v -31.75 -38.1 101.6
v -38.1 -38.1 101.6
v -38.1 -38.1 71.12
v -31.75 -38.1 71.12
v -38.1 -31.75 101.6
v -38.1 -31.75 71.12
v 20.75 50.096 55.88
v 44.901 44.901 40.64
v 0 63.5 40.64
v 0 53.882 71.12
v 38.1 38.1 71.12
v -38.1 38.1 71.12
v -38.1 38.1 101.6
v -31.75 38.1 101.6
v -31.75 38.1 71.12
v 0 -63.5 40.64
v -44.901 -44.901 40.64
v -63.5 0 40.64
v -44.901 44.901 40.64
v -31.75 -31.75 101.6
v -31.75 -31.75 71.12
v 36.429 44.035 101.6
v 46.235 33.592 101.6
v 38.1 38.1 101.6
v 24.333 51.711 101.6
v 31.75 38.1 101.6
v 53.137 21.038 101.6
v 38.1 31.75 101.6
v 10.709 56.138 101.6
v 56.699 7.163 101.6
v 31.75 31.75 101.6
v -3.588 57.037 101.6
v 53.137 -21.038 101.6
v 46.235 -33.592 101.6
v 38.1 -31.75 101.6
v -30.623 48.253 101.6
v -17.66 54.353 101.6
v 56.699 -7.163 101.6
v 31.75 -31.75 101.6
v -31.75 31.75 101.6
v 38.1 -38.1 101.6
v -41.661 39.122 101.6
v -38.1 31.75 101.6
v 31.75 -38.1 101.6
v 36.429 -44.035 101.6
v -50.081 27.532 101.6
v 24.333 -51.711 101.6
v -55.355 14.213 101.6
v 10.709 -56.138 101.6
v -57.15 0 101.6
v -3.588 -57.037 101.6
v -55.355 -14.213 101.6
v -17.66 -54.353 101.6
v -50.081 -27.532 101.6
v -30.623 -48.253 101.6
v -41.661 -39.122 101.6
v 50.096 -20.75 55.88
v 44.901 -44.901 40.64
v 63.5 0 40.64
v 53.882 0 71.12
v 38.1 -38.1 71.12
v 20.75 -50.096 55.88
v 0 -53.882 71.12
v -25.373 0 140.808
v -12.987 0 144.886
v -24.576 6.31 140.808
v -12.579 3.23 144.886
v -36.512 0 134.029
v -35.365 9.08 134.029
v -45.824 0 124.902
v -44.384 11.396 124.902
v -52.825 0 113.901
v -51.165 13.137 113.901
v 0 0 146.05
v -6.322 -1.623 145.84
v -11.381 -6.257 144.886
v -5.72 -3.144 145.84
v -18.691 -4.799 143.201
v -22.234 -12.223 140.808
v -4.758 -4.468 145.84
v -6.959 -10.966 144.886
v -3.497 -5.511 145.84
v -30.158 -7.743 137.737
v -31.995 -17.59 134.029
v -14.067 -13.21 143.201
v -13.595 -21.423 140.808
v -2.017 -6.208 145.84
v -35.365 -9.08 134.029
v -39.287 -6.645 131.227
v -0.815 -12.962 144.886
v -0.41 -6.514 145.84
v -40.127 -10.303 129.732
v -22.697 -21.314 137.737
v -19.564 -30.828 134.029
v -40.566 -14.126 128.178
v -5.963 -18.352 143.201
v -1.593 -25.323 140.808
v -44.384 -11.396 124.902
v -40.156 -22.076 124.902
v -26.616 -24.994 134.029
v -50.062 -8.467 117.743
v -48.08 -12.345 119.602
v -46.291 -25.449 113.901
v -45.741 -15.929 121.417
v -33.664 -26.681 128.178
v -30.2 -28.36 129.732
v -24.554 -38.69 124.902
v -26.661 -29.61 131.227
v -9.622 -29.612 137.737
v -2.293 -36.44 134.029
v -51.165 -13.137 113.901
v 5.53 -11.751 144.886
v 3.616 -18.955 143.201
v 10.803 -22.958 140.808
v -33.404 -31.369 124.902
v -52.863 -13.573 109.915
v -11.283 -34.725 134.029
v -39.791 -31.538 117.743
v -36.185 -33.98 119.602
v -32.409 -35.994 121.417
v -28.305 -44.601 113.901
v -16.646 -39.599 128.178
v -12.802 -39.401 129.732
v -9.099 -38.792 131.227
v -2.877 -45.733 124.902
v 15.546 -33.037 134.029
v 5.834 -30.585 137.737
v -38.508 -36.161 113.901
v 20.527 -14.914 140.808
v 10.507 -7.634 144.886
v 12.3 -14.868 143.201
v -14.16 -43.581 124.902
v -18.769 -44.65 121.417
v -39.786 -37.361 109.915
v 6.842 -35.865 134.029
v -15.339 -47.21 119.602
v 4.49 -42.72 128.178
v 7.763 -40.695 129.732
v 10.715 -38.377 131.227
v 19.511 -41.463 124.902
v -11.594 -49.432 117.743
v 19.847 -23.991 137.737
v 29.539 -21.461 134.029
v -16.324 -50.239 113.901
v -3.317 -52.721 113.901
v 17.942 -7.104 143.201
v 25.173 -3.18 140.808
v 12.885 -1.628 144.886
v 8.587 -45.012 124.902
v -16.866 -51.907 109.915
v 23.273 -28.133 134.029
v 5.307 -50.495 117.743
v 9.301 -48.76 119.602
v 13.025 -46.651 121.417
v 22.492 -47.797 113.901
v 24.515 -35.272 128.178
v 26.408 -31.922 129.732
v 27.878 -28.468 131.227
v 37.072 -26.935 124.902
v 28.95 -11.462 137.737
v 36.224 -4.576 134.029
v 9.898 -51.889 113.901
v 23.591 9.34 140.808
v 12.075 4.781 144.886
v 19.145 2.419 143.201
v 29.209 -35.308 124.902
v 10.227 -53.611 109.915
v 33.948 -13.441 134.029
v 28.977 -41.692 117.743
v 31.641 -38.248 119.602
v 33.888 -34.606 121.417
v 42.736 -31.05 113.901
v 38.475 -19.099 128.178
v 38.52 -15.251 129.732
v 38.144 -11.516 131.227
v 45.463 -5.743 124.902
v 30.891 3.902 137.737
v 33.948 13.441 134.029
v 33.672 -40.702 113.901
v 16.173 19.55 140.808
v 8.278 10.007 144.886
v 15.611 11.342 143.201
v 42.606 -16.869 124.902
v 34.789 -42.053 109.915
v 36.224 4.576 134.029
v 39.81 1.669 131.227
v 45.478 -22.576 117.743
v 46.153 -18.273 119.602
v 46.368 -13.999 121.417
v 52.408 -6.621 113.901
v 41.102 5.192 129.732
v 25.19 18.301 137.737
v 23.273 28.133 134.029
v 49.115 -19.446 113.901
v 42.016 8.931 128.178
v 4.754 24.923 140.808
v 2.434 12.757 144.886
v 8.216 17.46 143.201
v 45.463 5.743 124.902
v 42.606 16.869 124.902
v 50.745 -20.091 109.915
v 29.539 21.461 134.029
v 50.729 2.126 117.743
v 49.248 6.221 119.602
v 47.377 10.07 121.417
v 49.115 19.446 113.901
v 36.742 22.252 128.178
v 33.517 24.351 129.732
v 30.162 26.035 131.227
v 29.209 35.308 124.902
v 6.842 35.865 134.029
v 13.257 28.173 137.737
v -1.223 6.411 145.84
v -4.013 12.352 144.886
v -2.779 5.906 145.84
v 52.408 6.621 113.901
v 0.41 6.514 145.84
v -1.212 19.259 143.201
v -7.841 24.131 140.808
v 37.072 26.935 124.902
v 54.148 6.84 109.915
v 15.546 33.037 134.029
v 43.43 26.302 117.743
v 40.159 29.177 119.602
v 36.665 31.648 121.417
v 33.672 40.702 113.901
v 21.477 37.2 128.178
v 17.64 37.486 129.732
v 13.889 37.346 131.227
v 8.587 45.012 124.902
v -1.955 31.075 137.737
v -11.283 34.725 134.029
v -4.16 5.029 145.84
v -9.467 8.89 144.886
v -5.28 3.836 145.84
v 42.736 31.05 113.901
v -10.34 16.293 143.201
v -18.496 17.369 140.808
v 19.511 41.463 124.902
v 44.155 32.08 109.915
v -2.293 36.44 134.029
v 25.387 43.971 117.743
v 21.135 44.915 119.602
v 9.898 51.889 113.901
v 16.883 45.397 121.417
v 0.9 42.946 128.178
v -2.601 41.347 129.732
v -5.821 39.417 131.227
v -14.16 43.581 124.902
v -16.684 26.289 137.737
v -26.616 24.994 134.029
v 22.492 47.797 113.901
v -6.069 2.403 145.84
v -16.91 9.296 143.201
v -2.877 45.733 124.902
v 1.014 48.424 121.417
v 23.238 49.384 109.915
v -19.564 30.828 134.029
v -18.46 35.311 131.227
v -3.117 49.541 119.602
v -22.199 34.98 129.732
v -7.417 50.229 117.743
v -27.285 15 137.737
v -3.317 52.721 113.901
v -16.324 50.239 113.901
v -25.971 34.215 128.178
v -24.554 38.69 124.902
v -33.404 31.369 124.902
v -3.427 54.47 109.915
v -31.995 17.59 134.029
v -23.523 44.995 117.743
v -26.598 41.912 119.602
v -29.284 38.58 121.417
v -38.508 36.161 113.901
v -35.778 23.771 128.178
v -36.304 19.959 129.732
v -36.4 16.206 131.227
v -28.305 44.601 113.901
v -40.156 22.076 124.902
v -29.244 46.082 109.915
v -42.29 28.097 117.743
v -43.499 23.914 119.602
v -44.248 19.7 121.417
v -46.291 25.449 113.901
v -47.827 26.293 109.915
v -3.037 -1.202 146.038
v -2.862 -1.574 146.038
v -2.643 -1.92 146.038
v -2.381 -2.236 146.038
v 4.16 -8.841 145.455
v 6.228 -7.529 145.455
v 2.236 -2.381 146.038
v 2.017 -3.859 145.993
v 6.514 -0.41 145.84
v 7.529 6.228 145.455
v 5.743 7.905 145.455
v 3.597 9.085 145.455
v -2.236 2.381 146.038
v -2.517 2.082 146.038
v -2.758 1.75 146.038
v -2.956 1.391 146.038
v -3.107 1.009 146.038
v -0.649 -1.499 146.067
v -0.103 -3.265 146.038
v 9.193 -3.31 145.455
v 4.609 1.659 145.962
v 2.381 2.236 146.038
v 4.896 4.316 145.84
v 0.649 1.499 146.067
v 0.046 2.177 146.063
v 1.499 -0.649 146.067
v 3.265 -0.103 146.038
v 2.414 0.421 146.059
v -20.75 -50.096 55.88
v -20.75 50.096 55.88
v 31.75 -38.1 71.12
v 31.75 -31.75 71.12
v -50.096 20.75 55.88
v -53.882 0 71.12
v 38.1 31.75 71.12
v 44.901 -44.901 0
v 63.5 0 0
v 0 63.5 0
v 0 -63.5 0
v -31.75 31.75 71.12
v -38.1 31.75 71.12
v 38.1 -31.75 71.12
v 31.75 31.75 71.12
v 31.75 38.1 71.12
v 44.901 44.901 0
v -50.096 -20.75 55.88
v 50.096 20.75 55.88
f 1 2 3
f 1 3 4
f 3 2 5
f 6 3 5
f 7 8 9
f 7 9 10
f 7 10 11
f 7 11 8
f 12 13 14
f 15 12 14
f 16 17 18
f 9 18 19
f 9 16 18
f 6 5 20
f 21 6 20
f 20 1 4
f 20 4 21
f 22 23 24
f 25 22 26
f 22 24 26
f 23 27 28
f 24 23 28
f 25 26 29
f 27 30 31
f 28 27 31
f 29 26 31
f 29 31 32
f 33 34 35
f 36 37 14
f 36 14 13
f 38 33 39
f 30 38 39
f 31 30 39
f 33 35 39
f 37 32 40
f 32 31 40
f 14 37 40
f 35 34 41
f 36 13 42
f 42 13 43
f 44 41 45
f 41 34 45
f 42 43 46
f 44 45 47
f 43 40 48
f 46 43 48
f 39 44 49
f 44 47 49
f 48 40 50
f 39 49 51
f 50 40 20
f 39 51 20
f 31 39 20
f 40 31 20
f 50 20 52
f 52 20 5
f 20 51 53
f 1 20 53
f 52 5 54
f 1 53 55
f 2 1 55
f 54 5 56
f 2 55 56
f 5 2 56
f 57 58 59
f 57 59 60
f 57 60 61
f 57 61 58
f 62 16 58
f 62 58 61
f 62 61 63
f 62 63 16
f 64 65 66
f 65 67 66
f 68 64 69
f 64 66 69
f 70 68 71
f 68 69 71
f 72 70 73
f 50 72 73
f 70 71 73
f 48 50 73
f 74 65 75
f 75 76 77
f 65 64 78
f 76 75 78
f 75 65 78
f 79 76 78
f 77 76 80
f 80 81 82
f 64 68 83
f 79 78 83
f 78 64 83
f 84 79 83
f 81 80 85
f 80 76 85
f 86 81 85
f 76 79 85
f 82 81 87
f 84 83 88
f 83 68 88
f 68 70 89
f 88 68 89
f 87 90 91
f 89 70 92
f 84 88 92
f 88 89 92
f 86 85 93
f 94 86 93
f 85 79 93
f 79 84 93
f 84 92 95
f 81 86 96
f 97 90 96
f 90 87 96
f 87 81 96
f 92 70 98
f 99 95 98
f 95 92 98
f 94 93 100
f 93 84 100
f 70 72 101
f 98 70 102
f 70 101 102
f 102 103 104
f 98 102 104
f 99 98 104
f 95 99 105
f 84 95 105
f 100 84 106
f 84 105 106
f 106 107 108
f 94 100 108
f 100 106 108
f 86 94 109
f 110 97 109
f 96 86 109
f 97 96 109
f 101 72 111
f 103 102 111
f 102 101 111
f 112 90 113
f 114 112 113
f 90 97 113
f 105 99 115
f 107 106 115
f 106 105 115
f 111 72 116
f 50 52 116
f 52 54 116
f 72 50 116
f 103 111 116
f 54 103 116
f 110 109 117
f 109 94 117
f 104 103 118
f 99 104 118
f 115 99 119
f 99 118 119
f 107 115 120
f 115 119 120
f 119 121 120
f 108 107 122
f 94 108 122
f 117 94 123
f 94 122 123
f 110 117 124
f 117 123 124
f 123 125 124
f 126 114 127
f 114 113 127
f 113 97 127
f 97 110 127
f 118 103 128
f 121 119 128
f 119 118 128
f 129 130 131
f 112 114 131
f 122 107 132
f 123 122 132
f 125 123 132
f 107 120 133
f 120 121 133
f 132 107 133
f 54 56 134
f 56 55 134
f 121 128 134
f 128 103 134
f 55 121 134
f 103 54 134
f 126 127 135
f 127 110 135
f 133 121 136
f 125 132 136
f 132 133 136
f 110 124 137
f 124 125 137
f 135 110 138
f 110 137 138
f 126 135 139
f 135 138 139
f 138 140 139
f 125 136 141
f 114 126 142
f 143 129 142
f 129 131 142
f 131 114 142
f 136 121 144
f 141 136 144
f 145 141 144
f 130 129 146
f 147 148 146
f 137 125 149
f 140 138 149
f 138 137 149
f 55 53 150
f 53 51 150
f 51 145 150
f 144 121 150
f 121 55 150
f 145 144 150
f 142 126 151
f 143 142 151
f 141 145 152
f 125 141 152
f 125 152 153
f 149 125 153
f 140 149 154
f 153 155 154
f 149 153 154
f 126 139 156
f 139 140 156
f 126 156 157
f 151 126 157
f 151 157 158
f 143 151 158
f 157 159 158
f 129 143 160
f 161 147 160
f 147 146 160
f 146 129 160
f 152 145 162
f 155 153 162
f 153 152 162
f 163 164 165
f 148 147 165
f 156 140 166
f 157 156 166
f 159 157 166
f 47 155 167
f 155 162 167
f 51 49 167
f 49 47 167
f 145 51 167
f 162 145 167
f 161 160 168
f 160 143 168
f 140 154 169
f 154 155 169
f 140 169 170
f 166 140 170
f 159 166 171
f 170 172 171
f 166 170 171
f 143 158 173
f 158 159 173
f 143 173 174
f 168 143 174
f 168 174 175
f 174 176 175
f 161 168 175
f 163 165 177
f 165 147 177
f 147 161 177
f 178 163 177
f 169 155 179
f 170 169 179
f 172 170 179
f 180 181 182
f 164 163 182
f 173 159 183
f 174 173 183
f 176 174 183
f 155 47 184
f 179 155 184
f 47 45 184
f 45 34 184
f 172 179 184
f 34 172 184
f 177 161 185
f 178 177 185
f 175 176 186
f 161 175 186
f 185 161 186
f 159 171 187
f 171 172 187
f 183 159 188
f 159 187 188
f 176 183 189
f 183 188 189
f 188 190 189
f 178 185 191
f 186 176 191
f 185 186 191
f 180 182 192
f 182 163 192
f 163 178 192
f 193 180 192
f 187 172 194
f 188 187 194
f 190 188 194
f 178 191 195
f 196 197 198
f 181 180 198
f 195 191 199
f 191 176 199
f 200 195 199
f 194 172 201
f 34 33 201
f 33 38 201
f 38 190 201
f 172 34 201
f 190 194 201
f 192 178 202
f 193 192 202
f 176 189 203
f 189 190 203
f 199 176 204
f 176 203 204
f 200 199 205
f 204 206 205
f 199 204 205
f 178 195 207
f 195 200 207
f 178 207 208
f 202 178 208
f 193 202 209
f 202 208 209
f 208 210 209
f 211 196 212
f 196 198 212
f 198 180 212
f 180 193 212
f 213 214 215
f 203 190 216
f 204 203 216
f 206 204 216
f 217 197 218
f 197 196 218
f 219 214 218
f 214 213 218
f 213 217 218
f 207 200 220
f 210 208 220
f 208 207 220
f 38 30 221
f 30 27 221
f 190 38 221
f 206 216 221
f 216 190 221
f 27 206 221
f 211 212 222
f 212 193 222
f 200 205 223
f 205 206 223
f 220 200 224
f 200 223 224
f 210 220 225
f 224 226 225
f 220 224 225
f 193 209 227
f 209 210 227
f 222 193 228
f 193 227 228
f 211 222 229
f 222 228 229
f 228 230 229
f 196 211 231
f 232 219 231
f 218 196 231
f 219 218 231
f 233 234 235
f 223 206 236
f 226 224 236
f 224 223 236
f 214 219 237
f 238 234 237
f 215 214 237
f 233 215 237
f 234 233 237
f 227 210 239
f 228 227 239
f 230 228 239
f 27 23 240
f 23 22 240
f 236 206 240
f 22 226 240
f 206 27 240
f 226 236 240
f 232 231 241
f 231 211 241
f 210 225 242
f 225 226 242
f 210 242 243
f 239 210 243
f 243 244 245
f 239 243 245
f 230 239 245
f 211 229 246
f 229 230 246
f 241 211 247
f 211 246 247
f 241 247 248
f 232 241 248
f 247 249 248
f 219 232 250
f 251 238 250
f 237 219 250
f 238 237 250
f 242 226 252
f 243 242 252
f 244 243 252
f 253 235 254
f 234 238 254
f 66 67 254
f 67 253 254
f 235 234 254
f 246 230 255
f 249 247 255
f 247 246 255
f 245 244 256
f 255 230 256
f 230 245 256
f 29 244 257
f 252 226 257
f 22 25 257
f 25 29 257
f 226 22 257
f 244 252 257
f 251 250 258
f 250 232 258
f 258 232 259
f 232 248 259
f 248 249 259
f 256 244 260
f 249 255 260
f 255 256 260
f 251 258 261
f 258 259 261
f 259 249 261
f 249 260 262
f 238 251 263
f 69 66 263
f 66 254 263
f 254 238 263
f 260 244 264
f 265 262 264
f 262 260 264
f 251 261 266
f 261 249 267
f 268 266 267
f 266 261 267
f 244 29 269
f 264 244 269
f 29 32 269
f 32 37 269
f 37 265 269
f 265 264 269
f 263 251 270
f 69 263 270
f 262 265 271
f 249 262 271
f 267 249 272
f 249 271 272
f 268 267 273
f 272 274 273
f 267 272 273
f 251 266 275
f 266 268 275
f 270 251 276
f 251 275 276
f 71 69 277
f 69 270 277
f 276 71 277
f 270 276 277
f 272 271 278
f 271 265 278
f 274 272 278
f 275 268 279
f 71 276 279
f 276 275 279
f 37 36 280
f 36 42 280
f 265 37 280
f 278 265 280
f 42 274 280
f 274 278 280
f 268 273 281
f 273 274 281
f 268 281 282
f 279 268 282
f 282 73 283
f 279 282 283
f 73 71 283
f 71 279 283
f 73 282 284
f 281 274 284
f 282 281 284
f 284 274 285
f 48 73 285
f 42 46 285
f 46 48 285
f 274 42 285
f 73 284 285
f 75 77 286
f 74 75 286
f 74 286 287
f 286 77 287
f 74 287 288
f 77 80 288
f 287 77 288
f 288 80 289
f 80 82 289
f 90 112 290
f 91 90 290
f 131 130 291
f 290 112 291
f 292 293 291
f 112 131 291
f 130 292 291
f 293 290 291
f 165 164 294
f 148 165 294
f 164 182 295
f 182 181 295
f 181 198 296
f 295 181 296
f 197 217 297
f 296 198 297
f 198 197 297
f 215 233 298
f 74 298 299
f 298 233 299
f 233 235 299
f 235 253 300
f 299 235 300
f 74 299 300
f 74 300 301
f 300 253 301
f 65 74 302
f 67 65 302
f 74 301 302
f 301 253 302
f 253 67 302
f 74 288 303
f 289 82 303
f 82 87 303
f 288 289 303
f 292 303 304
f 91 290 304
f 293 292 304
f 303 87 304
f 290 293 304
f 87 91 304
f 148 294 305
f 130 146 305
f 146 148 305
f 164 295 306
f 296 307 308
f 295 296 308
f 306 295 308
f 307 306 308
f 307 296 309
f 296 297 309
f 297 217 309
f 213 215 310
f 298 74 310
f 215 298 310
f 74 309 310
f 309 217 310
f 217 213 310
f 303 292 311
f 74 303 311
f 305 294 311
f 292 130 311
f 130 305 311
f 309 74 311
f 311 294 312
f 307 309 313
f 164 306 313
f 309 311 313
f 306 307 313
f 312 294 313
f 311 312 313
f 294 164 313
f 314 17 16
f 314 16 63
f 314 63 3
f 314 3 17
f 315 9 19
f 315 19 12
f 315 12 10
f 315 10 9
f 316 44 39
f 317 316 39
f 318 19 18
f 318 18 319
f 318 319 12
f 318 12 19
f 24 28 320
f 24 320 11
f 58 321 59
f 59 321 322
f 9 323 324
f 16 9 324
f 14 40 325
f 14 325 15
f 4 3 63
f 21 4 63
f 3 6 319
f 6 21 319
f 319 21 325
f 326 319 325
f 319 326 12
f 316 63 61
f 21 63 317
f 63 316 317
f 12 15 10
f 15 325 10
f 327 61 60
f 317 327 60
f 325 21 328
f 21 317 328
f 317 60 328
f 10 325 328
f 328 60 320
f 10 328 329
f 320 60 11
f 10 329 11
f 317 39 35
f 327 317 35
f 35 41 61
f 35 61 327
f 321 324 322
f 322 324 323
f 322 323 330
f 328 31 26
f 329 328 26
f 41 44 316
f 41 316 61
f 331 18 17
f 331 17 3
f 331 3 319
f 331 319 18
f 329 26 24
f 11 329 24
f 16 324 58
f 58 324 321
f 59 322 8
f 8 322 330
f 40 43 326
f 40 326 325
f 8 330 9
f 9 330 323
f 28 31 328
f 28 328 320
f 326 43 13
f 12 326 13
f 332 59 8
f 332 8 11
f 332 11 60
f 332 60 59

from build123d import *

# Parameters (mm, degrees)
F2_DEPTH = 40.64
F7_W     = 6.35
F7_H     = 6.35
F8_DEPTH = 30.48


with BuildPart() as f2:
    # F1 (on Top) → F2 (new body)
    with BuildSketch(Plane.XY):
        Polygon((44.901281, 44.901281), (0, 63.5), (0, -63.5), (44.901281, -44.901281), (63.5, 0), align=None)
    extrude(amount=F2_DEPTH)

    # F3 (on offset) → F6 section 0
    with BuildSketch(Plane.XY.offset(40.64)):
        Polygon((0, -63.5), (44.901281, -44.901281), (63.5, 0), (44.901281, 44.901281), (0, 63.5), (-44.901281, 44.901281), (-63.5, 0), (-44.901281, -44.901281), align=None)
    # F5 (on offset) → F6 section 1
    with BuildSketch(Plane.XY.offset(71.12)):
        Polygon((0, 53.881537), (-38.1, 38.1), (-53.881537, 0), (-38.1, -38.1), (0, -53.881537), (38.1, -38.1), (53.881537, 0), (38.1, 38.1), align=None)
    loft()

    # F7 (on offset) → F8 (join)
    with BuildSketch(Plane.XY.offset(71.12)):
        with Locations((-34.925, 34.925)):
            Rectangle(F7_W, F7_H)
        with Locations((34.925, 34.925)):
            Rectangle(F7_W, F7_H)
        with Locations((34.925, -34.925)):
            Rectangle(F7_W, F7_H)
        with Locations((-34.925, -34.925)):
            Rectangle(F7_W, F7_H)
    extrude(amount=F8_DEPTH)

    # F12 (on Front) → F13 (revolve)
    with BuildSketch(Plane.XZ):
        with BuildLine():
            ThreePointArc((0, 146.05), (-36.511636, 134.029246), (-57.15, 101.6))
            Line((-57.15, 101.6), (0, 101.6))
            Line((0, 101.6), (0, 146.05))
        make_face()
    revolve(axis=Axis((0, 0, 123.825), (0, 0, 1)))


solid = f2.part
